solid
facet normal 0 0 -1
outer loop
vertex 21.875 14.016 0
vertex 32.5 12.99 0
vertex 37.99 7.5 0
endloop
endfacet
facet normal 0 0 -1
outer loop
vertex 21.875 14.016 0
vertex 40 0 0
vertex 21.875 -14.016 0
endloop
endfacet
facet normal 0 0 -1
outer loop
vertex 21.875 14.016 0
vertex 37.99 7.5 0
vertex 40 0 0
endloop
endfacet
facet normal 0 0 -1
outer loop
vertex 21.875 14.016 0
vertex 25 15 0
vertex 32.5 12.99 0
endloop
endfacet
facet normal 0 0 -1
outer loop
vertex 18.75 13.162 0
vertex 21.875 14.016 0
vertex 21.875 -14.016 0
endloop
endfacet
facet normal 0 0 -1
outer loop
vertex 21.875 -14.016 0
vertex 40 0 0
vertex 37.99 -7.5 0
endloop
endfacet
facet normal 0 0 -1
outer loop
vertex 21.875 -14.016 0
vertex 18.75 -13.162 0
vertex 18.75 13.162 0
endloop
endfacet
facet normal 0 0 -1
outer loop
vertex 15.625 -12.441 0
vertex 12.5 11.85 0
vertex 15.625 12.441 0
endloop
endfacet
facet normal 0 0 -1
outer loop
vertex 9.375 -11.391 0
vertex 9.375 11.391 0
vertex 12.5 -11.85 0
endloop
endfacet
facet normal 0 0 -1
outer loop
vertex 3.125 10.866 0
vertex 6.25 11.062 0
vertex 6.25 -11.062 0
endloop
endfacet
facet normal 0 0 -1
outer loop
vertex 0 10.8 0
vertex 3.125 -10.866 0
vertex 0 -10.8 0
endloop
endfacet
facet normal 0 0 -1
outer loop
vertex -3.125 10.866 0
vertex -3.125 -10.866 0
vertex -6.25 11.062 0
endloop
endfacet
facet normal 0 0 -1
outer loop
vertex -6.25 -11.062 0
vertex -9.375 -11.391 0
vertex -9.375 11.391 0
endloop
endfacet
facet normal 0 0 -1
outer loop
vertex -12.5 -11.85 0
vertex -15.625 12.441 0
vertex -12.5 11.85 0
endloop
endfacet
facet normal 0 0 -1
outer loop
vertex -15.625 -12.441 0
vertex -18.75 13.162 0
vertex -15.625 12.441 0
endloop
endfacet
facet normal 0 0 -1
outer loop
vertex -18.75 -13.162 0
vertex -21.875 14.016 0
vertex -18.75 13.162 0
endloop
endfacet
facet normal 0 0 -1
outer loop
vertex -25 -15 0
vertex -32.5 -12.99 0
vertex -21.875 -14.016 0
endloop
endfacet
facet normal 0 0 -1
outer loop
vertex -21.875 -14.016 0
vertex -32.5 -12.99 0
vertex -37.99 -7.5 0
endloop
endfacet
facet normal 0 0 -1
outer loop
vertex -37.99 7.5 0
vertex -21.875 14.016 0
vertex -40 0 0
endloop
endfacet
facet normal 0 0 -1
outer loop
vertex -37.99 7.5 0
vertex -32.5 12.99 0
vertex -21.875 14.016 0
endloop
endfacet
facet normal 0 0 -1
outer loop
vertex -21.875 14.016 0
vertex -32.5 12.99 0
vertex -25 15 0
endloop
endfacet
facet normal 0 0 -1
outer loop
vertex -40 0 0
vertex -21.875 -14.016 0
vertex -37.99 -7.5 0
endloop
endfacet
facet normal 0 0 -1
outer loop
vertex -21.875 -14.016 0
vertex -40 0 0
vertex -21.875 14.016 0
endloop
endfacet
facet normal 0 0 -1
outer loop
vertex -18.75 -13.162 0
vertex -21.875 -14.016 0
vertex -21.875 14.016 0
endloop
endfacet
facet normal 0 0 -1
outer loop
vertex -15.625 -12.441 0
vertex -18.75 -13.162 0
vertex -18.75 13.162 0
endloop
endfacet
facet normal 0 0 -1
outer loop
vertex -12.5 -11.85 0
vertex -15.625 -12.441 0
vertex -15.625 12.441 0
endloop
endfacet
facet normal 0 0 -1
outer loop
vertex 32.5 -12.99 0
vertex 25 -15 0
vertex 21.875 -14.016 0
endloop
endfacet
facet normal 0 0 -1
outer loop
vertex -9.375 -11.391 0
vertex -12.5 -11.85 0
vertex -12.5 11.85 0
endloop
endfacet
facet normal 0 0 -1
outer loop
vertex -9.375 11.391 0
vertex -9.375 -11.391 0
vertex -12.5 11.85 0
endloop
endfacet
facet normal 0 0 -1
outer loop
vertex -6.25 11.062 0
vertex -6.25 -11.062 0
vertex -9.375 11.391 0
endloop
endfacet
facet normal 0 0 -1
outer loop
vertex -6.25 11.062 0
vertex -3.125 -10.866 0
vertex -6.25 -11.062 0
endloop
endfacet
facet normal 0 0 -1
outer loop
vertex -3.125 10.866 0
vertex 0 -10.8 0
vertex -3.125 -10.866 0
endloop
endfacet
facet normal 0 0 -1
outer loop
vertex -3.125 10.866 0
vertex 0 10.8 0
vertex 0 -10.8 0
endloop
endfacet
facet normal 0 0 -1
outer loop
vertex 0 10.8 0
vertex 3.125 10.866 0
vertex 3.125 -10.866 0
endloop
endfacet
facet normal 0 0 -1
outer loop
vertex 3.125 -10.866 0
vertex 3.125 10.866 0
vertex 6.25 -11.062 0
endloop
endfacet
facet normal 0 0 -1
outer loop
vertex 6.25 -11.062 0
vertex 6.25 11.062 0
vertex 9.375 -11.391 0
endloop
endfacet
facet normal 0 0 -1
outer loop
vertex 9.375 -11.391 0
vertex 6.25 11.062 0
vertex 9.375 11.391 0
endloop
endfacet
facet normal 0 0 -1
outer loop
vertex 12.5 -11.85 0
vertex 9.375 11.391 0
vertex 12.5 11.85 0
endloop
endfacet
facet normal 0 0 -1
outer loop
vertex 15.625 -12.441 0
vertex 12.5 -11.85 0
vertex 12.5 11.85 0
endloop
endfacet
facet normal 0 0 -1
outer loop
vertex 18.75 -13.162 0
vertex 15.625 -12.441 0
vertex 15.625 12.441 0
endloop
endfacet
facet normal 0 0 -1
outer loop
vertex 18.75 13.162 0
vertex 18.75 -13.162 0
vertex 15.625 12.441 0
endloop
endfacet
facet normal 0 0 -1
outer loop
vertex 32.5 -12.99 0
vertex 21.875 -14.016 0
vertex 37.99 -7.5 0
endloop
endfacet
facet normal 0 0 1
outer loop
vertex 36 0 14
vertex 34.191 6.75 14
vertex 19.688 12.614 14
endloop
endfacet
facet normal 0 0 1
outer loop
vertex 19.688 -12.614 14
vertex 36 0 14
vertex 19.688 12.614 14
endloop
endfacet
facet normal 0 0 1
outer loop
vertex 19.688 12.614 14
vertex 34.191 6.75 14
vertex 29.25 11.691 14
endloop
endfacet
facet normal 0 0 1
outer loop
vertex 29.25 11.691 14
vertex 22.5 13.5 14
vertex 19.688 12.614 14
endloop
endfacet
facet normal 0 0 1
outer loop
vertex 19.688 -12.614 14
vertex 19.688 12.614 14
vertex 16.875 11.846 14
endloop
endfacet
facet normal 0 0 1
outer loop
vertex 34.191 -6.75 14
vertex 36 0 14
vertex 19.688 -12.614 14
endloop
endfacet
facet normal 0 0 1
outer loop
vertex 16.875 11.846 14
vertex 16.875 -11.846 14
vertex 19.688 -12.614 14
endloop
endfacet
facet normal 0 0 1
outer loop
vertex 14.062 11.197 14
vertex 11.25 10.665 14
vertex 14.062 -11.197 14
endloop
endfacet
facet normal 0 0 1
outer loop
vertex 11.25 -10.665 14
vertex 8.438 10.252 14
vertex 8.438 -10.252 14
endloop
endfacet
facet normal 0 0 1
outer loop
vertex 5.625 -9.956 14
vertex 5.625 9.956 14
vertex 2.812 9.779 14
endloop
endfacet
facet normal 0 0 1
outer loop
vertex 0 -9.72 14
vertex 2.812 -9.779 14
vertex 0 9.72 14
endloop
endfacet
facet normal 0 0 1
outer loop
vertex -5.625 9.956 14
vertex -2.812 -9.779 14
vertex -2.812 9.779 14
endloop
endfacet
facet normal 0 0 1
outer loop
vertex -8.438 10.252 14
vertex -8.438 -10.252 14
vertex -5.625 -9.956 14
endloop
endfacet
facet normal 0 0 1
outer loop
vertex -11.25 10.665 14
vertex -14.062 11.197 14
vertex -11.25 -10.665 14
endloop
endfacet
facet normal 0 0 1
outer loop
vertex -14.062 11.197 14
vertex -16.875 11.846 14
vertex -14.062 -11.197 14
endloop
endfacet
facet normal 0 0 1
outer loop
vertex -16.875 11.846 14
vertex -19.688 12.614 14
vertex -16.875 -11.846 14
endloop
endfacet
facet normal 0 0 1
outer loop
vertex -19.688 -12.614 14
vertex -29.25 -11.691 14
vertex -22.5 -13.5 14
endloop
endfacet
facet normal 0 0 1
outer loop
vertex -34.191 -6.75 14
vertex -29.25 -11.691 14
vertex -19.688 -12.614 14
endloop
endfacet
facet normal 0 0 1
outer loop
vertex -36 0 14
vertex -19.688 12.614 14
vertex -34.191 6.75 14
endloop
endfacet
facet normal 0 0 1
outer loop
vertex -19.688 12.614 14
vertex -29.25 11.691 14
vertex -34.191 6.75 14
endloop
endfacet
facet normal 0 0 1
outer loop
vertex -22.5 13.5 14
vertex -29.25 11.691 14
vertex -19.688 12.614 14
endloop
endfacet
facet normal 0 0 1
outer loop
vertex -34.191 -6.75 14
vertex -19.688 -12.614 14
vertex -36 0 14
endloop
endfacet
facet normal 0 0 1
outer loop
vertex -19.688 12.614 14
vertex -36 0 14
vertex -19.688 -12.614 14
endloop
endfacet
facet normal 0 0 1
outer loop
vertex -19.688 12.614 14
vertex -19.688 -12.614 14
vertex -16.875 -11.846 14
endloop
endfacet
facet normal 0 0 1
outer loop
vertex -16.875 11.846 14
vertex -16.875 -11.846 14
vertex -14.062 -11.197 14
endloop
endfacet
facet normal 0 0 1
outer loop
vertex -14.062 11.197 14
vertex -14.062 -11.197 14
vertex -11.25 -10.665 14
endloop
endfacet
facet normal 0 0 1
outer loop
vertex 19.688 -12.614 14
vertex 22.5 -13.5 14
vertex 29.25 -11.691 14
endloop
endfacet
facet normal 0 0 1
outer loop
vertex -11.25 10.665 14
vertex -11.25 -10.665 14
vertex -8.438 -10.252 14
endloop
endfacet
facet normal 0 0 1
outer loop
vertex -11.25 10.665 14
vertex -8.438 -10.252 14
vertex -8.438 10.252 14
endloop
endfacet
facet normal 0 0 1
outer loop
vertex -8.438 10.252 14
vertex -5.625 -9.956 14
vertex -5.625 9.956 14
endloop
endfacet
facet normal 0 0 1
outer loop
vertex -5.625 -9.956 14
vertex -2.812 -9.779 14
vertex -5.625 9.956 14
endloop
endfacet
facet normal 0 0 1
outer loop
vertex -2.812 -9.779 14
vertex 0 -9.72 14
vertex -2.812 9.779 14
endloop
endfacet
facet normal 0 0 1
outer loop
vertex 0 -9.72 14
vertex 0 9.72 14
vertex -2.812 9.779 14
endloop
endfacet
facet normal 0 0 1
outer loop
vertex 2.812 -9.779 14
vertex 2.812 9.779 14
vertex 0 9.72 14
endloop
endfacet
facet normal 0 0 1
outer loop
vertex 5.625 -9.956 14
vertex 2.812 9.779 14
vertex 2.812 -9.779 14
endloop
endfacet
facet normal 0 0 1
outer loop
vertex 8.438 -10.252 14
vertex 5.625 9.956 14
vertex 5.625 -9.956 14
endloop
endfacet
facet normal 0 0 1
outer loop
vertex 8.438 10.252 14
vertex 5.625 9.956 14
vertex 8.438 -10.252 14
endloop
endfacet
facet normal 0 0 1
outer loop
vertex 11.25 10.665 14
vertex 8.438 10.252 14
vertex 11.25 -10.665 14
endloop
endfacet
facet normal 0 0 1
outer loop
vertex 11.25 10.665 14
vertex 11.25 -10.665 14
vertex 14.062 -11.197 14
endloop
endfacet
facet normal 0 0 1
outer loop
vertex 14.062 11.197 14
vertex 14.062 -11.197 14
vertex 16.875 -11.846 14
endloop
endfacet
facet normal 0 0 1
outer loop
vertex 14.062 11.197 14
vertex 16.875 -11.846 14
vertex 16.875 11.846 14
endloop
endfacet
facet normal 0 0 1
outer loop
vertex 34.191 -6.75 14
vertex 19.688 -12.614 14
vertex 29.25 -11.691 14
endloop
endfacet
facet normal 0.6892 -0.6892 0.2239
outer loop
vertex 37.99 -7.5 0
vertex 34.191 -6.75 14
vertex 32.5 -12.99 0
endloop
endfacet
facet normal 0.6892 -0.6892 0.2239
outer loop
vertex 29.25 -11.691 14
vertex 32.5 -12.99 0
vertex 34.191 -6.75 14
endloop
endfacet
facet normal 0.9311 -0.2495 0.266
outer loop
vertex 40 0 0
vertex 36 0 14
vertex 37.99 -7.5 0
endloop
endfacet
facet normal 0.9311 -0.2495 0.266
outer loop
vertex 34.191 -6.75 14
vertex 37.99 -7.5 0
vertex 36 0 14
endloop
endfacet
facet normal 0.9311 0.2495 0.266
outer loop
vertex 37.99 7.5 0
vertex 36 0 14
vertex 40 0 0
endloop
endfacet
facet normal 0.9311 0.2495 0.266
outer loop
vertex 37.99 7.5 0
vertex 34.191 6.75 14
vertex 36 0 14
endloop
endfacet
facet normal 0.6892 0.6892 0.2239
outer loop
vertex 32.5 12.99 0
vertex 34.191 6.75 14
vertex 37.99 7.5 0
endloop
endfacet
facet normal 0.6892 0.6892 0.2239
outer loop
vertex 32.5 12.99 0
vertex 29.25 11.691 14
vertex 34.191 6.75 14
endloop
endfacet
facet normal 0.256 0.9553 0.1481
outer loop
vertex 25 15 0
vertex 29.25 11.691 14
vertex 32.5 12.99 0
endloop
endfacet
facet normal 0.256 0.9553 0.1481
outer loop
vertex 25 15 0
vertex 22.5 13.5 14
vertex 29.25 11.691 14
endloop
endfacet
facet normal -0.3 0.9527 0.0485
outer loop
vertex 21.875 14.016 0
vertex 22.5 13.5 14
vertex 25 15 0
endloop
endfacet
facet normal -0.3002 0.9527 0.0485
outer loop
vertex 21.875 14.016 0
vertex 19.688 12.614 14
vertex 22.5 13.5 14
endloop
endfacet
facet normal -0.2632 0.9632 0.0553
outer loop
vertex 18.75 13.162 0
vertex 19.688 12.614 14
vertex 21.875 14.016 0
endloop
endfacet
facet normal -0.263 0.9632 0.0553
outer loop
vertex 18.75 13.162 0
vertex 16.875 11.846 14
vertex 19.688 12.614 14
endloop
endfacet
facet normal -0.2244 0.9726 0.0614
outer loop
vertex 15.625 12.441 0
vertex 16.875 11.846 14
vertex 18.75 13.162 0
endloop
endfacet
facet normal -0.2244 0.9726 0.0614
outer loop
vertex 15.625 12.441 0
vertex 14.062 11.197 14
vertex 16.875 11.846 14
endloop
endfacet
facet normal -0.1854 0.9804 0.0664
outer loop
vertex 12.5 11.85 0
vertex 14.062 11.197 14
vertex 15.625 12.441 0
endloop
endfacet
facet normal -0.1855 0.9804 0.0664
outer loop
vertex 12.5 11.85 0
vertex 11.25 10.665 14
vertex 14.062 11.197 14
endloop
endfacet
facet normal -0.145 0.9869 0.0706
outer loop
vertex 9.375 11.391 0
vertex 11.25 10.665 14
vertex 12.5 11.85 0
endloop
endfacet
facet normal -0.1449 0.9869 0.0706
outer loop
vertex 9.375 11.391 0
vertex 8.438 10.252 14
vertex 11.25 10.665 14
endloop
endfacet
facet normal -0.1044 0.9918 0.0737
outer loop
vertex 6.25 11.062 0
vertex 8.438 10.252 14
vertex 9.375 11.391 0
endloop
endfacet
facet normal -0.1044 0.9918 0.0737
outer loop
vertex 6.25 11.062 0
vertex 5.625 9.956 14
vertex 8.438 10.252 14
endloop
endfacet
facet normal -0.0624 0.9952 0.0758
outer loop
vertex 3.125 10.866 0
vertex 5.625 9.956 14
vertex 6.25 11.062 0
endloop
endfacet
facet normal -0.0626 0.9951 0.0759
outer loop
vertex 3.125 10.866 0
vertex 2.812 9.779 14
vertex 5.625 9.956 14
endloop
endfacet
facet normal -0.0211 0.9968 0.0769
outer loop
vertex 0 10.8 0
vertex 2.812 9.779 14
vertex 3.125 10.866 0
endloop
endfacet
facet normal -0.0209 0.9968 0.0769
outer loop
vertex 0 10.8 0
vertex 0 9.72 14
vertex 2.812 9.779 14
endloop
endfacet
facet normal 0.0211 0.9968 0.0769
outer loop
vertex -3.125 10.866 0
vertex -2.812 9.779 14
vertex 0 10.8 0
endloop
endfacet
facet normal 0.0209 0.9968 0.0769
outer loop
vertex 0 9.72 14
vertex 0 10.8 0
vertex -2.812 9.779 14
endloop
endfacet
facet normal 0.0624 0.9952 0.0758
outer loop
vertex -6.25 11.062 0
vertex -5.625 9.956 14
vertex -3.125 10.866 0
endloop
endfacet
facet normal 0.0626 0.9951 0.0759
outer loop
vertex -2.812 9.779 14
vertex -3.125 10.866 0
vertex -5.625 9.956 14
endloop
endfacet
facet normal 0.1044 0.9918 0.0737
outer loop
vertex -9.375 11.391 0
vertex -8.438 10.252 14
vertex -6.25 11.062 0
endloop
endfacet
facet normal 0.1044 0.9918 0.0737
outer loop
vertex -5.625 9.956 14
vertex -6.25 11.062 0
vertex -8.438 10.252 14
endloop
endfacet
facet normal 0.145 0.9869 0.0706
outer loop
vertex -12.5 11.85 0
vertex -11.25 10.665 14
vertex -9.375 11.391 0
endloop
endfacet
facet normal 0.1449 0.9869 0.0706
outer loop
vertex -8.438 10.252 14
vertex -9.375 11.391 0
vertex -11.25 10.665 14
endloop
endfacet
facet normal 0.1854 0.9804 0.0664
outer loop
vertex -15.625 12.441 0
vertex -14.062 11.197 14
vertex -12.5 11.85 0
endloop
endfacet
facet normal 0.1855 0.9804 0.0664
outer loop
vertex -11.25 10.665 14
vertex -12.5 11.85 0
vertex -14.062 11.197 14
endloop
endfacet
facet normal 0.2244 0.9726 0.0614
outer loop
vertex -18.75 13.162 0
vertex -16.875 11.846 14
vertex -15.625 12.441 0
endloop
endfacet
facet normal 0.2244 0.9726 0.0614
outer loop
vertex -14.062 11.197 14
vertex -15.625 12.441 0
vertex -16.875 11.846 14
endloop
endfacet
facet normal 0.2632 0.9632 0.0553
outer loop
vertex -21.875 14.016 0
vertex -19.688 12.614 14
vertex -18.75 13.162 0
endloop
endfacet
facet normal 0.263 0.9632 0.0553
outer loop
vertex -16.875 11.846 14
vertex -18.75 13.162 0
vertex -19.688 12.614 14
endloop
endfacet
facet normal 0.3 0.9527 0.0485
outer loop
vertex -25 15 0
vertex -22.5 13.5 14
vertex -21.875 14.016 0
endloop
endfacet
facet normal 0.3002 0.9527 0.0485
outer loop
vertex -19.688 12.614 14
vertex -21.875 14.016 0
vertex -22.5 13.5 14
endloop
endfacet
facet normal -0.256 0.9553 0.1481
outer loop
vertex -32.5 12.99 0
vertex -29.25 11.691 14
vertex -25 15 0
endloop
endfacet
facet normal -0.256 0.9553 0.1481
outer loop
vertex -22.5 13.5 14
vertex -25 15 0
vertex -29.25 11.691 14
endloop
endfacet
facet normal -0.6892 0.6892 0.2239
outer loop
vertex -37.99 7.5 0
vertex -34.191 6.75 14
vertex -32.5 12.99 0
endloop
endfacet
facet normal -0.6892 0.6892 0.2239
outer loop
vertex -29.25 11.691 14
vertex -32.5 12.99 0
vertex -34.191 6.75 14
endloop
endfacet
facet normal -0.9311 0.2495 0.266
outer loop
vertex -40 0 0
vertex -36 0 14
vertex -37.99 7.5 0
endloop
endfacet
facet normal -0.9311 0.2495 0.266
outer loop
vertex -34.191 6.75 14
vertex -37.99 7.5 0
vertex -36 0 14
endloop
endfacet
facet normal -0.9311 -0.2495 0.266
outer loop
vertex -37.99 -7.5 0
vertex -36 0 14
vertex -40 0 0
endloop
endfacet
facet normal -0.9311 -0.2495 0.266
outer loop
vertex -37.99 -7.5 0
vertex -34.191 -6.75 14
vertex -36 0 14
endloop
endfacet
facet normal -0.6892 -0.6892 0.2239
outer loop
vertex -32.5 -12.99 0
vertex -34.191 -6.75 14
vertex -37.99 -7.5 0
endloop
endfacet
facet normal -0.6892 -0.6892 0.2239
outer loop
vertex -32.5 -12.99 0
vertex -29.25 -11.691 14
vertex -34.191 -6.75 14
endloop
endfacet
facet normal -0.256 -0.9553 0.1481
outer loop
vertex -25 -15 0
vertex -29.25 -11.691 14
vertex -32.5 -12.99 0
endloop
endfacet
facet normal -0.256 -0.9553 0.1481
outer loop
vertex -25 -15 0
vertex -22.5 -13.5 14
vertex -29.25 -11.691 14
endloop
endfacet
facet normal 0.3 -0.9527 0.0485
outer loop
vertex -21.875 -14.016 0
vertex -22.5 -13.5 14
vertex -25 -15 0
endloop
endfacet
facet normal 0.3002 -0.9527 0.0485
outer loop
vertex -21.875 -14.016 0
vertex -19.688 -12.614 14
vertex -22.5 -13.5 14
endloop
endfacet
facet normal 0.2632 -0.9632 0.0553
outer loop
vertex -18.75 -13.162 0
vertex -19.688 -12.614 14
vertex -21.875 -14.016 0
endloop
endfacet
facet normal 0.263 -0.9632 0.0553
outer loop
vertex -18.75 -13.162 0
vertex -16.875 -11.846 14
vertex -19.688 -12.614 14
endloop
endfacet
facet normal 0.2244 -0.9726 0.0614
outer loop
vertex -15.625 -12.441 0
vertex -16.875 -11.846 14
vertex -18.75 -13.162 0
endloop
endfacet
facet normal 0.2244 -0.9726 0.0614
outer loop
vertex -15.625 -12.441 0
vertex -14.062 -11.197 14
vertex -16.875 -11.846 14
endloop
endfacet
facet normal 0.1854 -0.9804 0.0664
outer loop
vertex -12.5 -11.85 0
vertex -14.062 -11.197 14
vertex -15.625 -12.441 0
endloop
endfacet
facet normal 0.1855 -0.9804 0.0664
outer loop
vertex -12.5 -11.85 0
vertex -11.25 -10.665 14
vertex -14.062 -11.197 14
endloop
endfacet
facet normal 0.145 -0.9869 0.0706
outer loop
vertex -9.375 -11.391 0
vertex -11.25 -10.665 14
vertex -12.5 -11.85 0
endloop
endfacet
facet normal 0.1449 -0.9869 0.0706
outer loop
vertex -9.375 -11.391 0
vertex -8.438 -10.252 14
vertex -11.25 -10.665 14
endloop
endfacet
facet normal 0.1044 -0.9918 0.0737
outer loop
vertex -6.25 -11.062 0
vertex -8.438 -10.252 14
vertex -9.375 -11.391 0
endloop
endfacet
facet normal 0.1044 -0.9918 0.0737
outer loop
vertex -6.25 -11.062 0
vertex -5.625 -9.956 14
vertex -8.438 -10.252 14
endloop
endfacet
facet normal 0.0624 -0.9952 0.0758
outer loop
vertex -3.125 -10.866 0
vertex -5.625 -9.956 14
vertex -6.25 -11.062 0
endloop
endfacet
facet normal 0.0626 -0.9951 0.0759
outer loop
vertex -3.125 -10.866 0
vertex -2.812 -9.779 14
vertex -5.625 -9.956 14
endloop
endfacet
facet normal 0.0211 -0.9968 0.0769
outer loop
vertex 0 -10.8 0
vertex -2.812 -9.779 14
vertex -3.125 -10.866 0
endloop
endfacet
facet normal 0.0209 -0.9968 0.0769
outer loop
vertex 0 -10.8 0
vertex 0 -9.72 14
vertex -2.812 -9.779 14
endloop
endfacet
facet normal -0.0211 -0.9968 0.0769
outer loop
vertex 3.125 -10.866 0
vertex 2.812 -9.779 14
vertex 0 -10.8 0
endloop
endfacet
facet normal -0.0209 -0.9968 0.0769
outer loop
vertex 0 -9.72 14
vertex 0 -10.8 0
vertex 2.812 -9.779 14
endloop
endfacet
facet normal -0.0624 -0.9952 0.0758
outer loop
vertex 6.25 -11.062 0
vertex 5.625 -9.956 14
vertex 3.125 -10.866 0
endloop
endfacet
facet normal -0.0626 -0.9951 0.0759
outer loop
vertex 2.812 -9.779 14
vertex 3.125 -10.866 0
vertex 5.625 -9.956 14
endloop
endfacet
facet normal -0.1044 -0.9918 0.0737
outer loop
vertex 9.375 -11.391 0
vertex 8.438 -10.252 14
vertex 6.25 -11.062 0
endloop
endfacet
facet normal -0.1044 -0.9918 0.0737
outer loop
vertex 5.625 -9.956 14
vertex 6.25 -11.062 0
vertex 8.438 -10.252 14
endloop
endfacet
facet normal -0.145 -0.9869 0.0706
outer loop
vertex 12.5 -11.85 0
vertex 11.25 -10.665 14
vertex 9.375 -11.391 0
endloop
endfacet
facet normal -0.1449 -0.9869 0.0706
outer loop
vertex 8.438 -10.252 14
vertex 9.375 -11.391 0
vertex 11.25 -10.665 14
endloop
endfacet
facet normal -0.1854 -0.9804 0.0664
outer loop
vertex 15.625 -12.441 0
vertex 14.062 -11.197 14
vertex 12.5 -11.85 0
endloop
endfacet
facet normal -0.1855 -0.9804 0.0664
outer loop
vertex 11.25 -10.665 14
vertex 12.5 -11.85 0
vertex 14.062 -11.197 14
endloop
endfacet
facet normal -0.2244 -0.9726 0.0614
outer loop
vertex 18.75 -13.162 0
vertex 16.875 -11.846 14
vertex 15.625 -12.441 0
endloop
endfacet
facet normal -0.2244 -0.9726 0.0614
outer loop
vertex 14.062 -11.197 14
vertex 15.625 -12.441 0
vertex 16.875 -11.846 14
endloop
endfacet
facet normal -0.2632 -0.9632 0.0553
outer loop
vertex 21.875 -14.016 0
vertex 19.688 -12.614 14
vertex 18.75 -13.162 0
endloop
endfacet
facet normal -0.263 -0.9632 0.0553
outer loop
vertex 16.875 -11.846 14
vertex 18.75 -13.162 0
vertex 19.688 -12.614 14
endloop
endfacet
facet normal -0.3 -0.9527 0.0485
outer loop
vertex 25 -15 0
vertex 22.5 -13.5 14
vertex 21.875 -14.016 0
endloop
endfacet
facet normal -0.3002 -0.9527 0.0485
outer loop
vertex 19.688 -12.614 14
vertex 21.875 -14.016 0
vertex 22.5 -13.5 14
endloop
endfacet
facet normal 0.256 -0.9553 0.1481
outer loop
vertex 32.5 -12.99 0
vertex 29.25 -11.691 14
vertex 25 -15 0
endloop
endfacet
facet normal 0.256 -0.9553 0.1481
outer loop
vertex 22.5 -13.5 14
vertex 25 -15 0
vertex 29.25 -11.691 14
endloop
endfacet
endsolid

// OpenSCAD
$fn = 32;

// ----------------------------------------------------------------------
// Handle: 80 x 30 mm grip, 14 mm thick
// ----------------------------------------------------------------------

// --- parameters (mm) ---
length = 80;              // grip length
width = 30;               // grip width
thickness = 14;           // grip thickness
waist = 0.72;             // width factor at the middle
draft = 0.9;              // top face scale of the extrusion

/* ergonomic grip outline, closed spline-like polygon in the XY plane */
grip = [[-25, 15], [-21.875, 14.016], [-18.75, 13.162], [-15.625, 12.441], [-12.5, 11.85], [-9.375, 11.391], [-6.25, 11.062], [-3.125, 10.866], [0, 10.8], [3.125, 10.866], [6.25, 11.062], [9.375, 11.391], [12.5, 11.85], [15.625, 12.441], [18.75, 13.162], [21.875, 14.016], [25, 15], [32.5, 12.99], [37.99, 7.5], [40, 0], [37.99, -7.5], [32.5, -12.99], [25, -15], [25, -15], [21.875, -14.016], [18.75, -13.162], [15.625, -12.441], [12.5, -11.85], [9.375, -11.391], [6.25, -11.062], [3.125, -10.866], [0, -10.8], [-3.125, -10.866], [-6.25, -11.062], [-9.375, -11.391], [-12.5, -11.85], [-15.625, -12.441], [-18.75, -13.162], [-21.875, -14.016], [-25, -15], [-32.5, -12.99], [-37.99, -7.5], [-40, 0], [-37.99, 7.5], [-32.5, 12.99], [-25, 15]];

module grip_body() {
  linear_extrude(height = thickness, scale = draft) polygon(grip);
}

difference() {
  union() {
    grip_body();
  }
}
